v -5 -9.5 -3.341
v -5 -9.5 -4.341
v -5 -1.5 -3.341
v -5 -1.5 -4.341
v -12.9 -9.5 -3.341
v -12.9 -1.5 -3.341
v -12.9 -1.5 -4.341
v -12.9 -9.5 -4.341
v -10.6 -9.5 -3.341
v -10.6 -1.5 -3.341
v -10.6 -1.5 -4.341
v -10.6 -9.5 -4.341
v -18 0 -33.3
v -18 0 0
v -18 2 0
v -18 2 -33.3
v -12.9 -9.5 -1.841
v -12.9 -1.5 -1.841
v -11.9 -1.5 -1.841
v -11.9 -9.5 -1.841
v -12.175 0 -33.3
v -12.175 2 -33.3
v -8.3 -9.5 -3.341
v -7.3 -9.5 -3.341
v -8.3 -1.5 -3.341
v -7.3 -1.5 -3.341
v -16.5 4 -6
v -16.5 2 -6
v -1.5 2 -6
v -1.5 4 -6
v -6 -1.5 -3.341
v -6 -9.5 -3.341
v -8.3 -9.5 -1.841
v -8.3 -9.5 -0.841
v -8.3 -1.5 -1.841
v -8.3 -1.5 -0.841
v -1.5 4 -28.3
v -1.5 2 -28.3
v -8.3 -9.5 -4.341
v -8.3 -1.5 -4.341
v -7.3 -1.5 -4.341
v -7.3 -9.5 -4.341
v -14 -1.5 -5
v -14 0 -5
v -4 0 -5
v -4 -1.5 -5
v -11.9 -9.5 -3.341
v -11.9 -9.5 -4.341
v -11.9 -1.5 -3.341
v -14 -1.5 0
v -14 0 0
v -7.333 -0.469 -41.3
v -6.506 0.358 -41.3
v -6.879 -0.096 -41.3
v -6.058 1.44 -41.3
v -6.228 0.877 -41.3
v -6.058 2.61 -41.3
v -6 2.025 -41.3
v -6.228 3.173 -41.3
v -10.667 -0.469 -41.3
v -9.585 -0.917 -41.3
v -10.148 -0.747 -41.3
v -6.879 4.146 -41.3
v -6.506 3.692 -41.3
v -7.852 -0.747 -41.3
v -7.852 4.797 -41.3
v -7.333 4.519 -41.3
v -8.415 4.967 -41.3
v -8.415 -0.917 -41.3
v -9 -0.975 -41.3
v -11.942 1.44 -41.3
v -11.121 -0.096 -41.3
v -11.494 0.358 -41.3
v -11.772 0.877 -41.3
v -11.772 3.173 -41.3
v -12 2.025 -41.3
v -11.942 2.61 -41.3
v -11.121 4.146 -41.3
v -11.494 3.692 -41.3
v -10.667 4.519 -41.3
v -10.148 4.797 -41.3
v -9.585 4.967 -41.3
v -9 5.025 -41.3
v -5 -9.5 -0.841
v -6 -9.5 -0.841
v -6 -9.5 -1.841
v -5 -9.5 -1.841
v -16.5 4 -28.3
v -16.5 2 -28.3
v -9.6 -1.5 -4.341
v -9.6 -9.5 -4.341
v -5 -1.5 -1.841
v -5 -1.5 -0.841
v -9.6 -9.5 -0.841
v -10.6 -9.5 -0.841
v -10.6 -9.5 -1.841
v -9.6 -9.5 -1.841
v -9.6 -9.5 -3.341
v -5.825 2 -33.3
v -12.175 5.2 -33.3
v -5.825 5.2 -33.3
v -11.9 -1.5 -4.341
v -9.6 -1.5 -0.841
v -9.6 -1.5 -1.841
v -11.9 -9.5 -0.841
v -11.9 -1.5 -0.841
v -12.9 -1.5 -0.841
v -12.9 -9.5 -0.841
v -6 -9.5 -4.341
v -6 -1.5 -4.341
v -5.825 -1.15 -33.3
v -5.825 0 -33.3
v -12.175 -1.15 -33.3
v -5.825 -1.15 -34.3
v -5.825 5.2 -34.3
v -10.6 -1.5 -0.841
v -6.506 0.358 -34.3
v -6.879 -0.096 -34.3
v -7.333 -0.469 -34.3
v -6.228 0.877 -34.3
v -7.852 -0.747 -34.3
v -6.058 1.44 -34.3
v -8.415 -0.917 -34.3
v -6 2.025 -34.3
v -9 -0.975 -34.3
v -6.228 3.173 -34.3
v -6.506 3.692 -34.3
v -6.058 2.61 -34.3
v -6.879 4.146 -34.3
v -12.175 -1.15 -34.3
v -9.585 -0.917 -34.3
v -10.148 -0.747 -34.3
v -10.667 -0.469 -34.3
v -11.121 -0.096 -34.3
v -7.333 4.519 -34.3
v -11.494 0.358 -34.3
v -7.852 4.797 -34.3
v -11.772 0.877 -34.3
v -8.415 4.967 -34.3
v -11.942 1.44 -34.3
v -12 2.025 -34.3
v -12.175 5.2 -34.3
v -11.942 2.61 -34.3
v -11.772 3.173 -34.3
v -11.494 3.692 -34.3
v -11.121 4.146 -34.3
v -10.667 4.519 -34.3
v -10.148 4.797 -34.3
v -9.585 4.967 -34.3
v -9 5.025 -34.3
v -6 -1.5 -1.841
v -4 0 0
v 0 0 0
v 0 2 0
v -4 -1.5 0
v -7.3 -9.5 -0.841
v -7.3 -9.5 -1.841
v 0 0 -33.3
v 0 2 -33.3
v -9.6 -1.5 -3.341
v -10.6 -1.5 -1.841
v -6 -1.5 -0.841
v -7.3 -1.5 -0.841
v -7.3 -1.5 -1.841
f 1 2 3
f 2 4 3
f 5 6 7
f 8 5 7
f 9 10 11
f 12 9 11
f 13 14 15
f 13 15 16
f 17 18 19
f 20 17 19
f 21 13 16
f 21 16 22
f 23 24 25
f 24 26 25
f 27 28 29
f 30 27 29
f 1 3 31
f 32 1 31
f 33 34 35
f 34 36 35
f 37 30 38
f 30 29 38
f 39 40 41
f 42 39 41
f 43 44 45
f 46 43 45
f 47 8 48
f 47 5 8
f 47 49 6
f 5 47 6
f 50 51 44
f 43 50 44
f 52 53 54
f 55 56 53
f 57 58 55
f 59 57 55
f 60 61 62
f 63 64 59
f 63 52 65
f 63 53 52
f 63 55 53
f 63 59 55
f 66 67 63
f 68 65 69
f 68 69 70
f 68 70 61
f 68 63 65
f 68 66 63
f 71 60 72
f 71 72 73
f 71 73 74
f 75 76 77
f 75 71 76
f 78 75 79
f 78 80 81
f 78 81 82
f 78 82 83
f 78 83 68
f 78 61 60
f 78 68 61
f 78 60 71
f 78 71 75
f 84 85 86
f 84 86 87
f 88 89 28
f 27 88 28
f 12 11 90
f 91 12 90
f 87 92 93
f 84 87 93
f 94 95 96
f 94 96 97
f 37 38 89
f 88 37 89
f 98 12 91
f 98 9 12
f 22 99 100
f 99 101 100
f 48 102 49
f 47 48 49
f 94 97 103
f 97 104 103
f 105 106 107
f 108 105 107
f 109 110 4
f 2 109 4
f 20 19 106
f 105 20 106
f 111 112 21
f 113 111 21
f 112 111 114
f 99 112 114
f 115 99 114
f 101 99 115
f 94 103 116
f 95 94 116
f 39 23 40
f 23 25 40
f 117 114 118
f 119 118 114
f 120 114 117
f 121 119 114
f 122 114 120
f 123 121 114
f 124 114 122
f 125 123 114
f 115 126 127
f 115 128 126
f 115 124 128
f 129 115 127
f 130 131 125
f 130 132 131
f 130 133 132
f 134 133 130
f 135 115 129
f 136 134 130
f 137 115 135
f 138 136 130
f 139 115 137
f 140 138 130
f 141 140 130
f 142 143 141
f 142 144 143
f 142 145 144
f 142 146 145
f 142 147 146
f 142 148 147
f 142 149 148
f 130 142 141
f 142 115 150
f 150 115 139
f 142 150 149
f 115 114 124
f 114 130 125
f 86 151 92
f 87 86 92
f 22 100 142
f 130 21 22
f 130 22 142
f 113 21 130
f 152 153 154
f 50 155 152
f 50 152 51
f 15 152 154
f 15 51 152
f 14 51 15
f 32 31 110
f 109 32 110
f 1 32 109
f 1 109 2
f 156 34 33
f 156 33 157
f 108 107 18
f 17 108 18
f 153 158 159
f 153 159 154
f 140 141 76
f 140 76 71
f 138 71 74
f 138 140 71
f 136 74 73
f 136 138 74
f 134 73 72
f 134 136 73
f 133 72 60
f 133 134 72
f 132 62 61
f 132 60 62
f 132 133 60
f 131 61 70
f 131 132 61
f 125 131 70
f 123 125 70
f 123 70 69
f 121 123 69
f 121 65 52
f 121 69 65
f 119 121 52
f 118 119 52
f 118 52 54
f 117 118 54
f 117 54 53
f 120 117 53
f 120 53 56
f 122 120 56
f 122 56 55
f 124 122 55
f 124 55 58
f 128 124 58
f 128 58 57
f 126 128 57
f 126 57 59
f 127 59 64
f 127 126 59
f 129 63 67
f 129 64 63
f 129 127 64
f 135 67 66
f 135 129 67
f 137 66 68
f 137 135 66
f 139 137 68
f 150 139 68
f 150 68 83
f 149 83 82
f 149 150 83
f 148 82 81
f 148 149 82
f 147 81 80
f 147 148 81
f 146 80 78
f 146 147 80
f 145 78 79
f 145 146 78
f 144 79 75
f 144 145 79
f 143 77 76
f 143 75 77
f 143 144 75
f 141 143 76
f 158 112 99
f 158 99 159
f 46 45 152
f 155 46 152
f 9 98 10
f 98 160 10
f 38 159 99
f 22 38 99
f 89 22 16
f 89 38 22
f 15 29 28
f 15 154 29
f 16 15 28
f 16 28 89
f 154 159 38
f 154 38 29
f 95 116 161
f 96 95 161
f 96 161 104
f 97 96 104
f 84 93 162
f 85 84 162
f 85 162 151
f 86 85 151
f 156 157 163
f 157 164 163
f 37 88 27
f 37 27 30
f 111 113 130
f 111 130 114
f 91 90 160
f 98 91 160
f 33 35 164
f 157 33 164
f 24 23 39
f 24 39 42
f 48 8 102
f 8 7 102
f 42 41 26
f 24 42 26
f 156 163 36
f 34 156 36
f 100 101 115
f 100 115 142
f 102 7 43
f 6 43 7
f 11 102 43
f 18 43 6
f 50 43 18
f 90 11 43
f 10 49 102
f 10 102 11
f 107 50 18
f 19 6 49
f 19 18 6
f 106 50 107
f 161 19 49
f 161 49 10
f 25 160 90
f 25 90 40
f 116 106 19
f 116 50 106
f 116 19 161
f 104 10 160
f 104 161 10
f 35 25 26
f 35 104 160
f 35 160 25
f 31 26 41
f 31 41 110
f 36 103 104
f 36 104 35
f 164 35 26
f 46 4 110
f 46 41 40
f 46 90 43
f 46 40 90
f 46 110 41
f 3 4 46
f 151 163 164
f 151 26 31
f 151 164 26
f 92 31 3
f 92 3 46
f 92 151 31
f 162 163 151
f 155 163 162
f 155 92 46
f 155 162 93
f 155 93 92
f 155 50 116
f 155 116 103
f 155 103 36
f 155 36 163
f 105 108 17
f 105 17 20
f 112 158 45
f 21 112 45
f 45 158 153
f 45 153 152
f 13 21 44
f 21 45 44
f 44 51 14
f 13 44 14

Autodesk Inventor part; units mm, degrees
ref_plane "YZ Plane" through (0, 0, 0) normal (1, 0, 0) x (0, 1, 0)
ref_plane "XZ Plane" through (0, 0, 0) normal (0, 1, 0) x (-1, 0, 0)
ref_plane "XY Plane" through (0, 0, 0) normal (0, 0, 1) x (1, 0, 0)
sketch "Sketch1" plane through (0, 0, 0) normal (0, 1, 0) x (-1, 0, 0)
  line L0 (0, 0) -> (18, 0)
  line L1 (18, 0) -> (18, -33.3)
  line L2 (18, -33.3) -> (0, -33.3)
  line L3 (0, -33.3) -> (0, 0)
  dimension "d0" = 33.3
  dimension "d1" = 18
extrude "Extrusion1" add sketch "Sketch1" along normal blind 2
sketch "Sketch2" plane through (0, 2, 0) normal (0, 1, 0) x (1, 0, 0)
  line L0 (-16.5, 6) -> (-1.5, 6)
  line L1 (-1.5, 6) -> (-1.5, 28.3)
  line L2 (-1.5, 28.3) -> (-16.5, 28.3)
  line L3 (-16.5, 28.3) -> (-16.5, 6)
  line L4 (-18, 0) -> (0, 0) projected
  line L5 (0, 33.3) -> (-18, 33.3) projected
  line L6 (-18, 33.3) -> (-18, 0) projected
  line L7 (0, 0) -> (0, 33.3) projected
  dimension "d4" = 6
  dimension "d5" = 5
  dimension "d6" = 1.5
  dimension "d7" = 1.5
extrude "Extrusion2" add sketch "Sketch2" along normal blind 2 contours L3 L2 L1 L0
sketch "Sketch3" plane through (0, 0, -33.3) normal (0, 0, -1) x (-1, 0, 0)
  line L0 (18, 0) -> (0, 0) construction
  line L1 (18, 0) -> (18, 2) construction
  line L2 (0, 2) -> (18, 2) construction
  line L3 (0, 0) -> (0, 2) construction
  line L4 (5.825, 5.2) -> (12.175, 5.2)
  line L5 (12.175, 5.2) -> (12.175, -1.15)
  line L6 (12.175, -1.15) -> (5.825, -1.15)
  line L7 (5.825, -1.15) -> (5.825, 5.2)
  point P0 (0, 0)
  point P1 (9, 5.2)
  point P2 (9, 2)
  dimension "d10" = 6.35
  dimension "d11" = 6.35
  dimension "d12" = 3.2
extrude "Extrusion3" add sketch "Sketch3" along normal blind 1
sketch "Sketch4" plane through (0, 0, -34.3) normal (0, 0, -1) x (-1, 0, 0)
  line L0 (12.175, 5.2) -> (5.825, 5.2) construction
  line L1 (5.825, 5.2) -> (5.825, -1.15) construction
  line L2 (5.825, -1.15) -> (12.175, -1.15) construction
  line L3 (12.175, -1.15) -> (12.175, 5.2) construction
  circle A0 centre (9, 2.025) radius 3
  point P0 (0, 0)
  dimension "d15" = 6
extrude "Extrusion4" add sketch "Sketch4" along normal blind 7
sketch "Sketch5" plane through (0, 0, 0) normal (0, -1, 0) x (1, 0, 0)
  line L0 (-18, 0) -> (0, 0) projected
  line L1 (-4, 0) -> (-14, 0)
  line L2 (-14, 0) -> (-14, -5)
  line L3 (-14, -5) -> (-4, -5)
  line L4 (-4, -5) -> (-4, 0)
  point P0 (-9, -5)
  point P1 (-9, 0)
  dimension "d18" = 5
  dimension "d19" = 10
extrude "Extrusion5" add sketch "Sketch5" along normal blind 1.5
sketch "Sketch6" plane through (0, -1.5, 0) normal (0, -1, 0) x (1, 0, 0)
  line L0 (-6, -1.8409) -> (-5, -1.8409)
  line L1 (-5, -1.8409) -> (-5, -0.8409)
  line L2 (-5, -0.8409) -> (-6, -0.8409)
  line L3 (-6, -0.8409) -> (-6, -1.8409)
  line L4 (-6, -4.3409) -> (-5, -4.3409)
  line L5 (-5, -4.3409) -> (-5, -3.3409)
  line L6 (-5, -3.3409) -> (-6, -3.3409)
  line L7 (-6, -3.3409) -> (-6, -4.3409)
  line L8 (-4, -5) -> (-4, 0) projected
  point P0 (0, 0)
  dimension "d22" = 1
  dimension "d23" = 1
  dimension "d24" = 1
  dimension "d25" = 1.5
  dimension "d26" = 1
extrude "Extrusion6" add sketch "Sketch6" along normal blind 8
pattern_linear "Rectangular Pattern1" count 4 spacing 2.3 along (-1, 0, 0) of "Extrusion6"
properties part number "SPIRadio" material "ABS Plastic"
